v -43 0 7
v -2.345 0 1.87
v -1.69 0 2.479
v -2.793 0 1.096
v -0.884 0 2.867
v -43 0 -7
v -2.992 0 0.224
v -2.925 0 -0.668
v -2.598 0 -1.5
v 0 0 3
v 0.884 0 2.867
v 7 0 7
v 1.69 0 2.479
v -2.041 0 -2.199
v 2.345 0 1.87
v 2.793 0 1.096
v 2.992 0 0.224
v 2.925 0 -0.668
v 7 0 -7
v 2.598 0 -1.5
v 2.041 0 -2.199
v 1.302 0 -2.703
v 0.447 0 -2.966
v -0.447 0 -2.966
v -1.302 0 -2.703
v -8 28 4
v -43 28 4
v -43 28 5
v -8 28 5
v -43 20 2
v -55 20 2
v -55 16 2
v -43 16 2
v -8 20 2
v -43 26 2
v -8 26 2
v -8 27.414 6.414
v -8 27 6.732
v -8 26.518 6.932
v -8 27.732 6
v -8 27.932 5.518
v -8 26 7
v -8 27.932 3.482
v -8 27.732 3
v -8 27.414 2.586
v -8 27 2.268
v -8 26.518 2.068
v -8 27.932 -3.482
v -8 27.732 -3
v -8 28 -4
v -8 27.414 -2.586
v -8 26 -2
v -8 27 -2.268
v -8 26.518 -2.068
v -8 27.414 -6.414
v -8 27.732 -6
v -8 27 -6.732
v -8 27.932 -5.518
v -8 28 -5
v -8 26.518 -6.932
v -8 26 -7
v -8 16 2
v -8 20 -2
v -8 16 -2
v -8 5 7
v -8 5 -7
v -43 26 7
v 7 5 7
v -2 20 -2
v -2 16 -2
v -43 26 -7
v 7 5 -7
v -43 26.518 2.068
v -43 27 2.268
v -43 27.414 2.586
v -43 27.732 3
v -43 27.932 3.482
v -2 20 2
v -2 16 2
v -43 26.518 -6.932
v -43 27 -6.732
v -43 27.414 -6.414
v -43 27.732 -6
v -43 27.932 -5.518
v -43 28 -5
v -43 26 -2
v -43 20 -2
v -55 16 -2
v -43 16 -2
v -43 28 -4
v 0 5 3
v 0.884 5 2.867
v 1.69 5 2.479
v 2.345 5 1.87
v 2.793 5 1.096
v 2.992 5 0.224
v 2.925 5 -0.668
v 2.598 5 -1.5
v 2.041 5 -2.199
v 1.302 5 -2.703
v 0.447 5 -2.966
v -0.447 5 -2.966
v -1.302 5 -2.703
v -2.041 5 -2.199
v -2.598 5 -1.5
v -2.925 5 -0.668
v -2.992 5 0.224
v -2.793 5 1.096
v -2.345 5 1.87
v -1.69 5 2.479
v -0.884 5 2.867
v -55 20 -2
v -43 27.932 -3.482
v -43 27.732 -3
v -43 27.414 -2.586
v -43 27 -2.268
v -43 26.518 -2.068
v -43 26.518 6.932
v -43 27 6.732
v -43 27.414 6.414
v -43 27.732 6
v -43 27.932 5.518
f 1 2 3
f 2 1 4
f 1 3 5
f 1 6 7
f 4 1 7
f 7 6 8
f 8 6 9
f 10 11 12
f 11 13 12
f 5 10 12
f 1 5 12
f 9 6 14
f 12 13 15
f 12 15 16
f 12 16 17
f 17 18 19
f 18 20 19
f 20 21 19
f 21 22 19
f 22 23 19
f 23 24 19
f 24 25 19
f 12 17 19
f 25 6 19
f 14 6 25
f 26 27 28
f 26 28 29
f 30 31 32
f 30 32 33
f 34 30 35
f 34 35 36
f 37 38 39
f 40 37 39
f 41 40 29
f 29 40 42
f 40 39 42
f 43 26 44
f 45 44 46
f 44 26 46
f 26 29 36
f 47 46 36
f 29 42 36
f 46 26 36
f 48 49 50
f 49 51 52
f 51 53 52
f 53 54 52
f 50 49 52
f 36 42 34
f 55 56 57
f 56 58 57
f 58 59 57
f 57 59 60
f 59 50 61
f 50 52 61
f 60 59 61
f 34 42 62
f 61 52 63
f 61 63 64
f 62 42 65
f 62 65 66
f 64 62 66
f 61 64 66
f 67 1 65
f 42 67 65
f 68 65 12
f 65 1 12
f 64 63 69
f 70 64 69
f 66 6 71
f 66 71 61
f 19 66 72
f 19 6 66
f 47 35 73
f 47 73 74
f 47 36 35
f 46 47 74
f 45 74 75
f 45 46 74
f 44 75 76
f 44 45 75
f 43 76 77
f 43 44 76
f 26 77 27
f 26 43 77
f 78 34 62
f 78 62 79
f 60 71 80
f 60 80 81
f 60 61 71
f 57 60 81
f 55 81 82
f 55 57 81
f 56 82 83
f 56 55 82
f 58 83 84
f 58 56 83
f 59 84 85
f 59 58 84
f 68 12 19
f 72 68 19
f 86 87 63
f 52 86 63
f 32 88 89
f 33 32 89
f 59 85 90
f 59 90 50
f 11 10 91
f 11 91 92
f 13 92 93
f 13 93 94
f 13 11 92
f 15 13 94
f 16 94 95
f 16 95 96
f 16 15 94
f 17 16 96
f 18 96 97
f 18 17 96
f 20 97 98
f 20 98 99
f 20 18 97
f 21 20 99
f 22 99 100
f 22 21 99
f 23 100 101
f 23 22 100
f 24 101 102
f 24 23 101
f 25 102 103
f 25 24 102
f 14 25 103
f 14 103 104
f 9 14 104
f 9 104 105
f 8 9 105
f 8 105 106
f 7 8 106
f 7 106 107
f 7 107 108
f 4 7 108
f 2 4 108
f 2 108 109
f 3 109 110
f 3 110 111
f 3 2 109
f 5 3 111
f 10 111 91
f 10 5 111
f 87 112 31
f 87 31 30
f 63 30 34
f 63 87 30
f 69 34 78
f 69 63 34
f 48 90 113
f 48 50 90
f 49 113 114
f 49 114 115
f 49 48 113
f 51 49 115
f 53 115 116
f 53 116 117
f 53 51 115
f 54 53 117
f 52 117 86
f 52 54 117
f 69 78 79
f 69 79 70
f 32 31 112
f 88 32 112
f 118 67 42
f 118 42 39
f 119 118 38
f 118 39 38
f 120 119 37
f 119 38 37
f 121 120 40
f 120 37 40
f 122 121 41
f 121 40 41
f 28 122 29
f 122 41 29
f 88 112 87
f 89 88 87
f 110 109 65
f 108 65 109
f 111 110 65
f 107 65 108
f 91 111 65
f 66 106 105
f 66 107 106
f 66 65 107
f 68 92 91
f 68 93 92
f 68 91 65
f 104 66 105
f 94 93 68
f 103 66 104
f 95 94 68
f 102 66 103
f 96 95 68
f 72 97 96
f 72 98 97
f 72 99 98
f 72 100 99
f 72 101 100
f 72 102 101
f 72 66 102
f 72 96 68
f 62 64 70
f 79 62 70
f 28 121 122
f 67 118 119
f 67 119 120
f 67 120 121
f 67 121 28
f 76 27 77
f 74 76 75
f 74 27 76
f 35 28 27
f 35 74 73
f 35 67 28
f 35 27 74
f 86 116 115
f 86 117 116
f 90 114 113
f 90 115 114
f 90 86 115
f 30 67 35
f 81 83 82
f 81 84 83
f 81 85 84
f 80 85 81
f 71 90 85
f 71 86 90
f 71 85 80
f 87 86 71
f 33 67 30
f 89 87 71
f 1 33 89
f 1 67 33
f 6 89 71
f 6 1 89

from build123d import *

# Parameters (mm, degrees)
SKETCH_1_W      = 50
SKETCH_1_H      = 14
SKETCH_1_R      = 3
EXTRUDE_1_DEPTH = 5
SKETCH_2_W      = 35
SKETCH_2_H      = 14
EXTRUDE_2_DEPTH = 15
SKETCH_3_W      = 35
SKETCH_3_H      = 5
EXTRUDE_3_DEPTH = 8
SKETCH_4_W      = 12
SKETCH_4_H      = 4
SKETCH_4_W_2    = 6
EXTRUDE_4_DEPTH = 4
FILLET_1_R      = 2


with BuildPart() as part:
    # Эскиз1 → Бобышка-Вытянуть1 (new body)
    with BuildSketch(Plane(origin=(0, 0, 0), x_dir=(1, 0, 0), z_dir=(0, 1, 0))):
        with Locations((-18, 0)):
            Rectangle(SKETCH_1_W, SKETCH_1_H)
        with Locations(Location((0, 0, 0), (0, 0, 270))):
            Circle(SKETCH_1_R, mode=Mode.SUBTRACT)
    extrude(amount=EXTRUDE_1_DEPTH)

    # Эскиз2 → Бобышка-Вытянуть2 (add)
    with BuildSketch(Plane(origin=(0, 5, 0), x_dir=(1, 0, 0), z_dir=(0, 1, 0))):
        with Locations((-25.5, 0)):
            Rectangle(SKETCH_2_W, SKETCH_2_H)
    extrude(amount=EXTRUDE_2_DEPTH)

    # Эскиз3 → Бобышка-Вытянуть3 (add)
    with BuildSketch(Plane(origin=(0, 20, 0), x_dir=(1, 0, 0), z_dir=(0, 1, 0))):
        with Locations((-25.5, -4.5)):
            Rectangle(SKETCH_3_W, SKETCH_3_H)
        with Locations((-25.5, 4.5)):
            Rectangle(SKETCH_3_W, SKETCH_3_H)
    extrude(amount=EXTRUDE_3_DEPTH)

    # Эскиз4 → Бобышка-Вытянуть4 (add)
    with BuildSketch(Plane(origin=(0, 20, 0), x_dir=(1, 0, 0), z_dir=(0, 1, 0))):
        with Locations((-49, 0)):
            Rectangle(SKETCH_4_W, SKETCH_4_H)
        with Locations((-5, 0)):
            Rectangle(SKETCH_4_W_2, SKETCH_4_H)
    extrude(amount=-EXTRUDE_4_DEPTH)

    # Скругление1
    fillet_1_edges = [part.edges().sort_by_distance(p)[0] for p in [
        (-25.5, 28, 7),
        (-25.5, 28, 2),
        (-25.5, 28, -7),
        (-25.5, 28, -2),
    ]]
    fillet(fillet_1_edges, radius=FILLET_1_R)


solid = part.part
